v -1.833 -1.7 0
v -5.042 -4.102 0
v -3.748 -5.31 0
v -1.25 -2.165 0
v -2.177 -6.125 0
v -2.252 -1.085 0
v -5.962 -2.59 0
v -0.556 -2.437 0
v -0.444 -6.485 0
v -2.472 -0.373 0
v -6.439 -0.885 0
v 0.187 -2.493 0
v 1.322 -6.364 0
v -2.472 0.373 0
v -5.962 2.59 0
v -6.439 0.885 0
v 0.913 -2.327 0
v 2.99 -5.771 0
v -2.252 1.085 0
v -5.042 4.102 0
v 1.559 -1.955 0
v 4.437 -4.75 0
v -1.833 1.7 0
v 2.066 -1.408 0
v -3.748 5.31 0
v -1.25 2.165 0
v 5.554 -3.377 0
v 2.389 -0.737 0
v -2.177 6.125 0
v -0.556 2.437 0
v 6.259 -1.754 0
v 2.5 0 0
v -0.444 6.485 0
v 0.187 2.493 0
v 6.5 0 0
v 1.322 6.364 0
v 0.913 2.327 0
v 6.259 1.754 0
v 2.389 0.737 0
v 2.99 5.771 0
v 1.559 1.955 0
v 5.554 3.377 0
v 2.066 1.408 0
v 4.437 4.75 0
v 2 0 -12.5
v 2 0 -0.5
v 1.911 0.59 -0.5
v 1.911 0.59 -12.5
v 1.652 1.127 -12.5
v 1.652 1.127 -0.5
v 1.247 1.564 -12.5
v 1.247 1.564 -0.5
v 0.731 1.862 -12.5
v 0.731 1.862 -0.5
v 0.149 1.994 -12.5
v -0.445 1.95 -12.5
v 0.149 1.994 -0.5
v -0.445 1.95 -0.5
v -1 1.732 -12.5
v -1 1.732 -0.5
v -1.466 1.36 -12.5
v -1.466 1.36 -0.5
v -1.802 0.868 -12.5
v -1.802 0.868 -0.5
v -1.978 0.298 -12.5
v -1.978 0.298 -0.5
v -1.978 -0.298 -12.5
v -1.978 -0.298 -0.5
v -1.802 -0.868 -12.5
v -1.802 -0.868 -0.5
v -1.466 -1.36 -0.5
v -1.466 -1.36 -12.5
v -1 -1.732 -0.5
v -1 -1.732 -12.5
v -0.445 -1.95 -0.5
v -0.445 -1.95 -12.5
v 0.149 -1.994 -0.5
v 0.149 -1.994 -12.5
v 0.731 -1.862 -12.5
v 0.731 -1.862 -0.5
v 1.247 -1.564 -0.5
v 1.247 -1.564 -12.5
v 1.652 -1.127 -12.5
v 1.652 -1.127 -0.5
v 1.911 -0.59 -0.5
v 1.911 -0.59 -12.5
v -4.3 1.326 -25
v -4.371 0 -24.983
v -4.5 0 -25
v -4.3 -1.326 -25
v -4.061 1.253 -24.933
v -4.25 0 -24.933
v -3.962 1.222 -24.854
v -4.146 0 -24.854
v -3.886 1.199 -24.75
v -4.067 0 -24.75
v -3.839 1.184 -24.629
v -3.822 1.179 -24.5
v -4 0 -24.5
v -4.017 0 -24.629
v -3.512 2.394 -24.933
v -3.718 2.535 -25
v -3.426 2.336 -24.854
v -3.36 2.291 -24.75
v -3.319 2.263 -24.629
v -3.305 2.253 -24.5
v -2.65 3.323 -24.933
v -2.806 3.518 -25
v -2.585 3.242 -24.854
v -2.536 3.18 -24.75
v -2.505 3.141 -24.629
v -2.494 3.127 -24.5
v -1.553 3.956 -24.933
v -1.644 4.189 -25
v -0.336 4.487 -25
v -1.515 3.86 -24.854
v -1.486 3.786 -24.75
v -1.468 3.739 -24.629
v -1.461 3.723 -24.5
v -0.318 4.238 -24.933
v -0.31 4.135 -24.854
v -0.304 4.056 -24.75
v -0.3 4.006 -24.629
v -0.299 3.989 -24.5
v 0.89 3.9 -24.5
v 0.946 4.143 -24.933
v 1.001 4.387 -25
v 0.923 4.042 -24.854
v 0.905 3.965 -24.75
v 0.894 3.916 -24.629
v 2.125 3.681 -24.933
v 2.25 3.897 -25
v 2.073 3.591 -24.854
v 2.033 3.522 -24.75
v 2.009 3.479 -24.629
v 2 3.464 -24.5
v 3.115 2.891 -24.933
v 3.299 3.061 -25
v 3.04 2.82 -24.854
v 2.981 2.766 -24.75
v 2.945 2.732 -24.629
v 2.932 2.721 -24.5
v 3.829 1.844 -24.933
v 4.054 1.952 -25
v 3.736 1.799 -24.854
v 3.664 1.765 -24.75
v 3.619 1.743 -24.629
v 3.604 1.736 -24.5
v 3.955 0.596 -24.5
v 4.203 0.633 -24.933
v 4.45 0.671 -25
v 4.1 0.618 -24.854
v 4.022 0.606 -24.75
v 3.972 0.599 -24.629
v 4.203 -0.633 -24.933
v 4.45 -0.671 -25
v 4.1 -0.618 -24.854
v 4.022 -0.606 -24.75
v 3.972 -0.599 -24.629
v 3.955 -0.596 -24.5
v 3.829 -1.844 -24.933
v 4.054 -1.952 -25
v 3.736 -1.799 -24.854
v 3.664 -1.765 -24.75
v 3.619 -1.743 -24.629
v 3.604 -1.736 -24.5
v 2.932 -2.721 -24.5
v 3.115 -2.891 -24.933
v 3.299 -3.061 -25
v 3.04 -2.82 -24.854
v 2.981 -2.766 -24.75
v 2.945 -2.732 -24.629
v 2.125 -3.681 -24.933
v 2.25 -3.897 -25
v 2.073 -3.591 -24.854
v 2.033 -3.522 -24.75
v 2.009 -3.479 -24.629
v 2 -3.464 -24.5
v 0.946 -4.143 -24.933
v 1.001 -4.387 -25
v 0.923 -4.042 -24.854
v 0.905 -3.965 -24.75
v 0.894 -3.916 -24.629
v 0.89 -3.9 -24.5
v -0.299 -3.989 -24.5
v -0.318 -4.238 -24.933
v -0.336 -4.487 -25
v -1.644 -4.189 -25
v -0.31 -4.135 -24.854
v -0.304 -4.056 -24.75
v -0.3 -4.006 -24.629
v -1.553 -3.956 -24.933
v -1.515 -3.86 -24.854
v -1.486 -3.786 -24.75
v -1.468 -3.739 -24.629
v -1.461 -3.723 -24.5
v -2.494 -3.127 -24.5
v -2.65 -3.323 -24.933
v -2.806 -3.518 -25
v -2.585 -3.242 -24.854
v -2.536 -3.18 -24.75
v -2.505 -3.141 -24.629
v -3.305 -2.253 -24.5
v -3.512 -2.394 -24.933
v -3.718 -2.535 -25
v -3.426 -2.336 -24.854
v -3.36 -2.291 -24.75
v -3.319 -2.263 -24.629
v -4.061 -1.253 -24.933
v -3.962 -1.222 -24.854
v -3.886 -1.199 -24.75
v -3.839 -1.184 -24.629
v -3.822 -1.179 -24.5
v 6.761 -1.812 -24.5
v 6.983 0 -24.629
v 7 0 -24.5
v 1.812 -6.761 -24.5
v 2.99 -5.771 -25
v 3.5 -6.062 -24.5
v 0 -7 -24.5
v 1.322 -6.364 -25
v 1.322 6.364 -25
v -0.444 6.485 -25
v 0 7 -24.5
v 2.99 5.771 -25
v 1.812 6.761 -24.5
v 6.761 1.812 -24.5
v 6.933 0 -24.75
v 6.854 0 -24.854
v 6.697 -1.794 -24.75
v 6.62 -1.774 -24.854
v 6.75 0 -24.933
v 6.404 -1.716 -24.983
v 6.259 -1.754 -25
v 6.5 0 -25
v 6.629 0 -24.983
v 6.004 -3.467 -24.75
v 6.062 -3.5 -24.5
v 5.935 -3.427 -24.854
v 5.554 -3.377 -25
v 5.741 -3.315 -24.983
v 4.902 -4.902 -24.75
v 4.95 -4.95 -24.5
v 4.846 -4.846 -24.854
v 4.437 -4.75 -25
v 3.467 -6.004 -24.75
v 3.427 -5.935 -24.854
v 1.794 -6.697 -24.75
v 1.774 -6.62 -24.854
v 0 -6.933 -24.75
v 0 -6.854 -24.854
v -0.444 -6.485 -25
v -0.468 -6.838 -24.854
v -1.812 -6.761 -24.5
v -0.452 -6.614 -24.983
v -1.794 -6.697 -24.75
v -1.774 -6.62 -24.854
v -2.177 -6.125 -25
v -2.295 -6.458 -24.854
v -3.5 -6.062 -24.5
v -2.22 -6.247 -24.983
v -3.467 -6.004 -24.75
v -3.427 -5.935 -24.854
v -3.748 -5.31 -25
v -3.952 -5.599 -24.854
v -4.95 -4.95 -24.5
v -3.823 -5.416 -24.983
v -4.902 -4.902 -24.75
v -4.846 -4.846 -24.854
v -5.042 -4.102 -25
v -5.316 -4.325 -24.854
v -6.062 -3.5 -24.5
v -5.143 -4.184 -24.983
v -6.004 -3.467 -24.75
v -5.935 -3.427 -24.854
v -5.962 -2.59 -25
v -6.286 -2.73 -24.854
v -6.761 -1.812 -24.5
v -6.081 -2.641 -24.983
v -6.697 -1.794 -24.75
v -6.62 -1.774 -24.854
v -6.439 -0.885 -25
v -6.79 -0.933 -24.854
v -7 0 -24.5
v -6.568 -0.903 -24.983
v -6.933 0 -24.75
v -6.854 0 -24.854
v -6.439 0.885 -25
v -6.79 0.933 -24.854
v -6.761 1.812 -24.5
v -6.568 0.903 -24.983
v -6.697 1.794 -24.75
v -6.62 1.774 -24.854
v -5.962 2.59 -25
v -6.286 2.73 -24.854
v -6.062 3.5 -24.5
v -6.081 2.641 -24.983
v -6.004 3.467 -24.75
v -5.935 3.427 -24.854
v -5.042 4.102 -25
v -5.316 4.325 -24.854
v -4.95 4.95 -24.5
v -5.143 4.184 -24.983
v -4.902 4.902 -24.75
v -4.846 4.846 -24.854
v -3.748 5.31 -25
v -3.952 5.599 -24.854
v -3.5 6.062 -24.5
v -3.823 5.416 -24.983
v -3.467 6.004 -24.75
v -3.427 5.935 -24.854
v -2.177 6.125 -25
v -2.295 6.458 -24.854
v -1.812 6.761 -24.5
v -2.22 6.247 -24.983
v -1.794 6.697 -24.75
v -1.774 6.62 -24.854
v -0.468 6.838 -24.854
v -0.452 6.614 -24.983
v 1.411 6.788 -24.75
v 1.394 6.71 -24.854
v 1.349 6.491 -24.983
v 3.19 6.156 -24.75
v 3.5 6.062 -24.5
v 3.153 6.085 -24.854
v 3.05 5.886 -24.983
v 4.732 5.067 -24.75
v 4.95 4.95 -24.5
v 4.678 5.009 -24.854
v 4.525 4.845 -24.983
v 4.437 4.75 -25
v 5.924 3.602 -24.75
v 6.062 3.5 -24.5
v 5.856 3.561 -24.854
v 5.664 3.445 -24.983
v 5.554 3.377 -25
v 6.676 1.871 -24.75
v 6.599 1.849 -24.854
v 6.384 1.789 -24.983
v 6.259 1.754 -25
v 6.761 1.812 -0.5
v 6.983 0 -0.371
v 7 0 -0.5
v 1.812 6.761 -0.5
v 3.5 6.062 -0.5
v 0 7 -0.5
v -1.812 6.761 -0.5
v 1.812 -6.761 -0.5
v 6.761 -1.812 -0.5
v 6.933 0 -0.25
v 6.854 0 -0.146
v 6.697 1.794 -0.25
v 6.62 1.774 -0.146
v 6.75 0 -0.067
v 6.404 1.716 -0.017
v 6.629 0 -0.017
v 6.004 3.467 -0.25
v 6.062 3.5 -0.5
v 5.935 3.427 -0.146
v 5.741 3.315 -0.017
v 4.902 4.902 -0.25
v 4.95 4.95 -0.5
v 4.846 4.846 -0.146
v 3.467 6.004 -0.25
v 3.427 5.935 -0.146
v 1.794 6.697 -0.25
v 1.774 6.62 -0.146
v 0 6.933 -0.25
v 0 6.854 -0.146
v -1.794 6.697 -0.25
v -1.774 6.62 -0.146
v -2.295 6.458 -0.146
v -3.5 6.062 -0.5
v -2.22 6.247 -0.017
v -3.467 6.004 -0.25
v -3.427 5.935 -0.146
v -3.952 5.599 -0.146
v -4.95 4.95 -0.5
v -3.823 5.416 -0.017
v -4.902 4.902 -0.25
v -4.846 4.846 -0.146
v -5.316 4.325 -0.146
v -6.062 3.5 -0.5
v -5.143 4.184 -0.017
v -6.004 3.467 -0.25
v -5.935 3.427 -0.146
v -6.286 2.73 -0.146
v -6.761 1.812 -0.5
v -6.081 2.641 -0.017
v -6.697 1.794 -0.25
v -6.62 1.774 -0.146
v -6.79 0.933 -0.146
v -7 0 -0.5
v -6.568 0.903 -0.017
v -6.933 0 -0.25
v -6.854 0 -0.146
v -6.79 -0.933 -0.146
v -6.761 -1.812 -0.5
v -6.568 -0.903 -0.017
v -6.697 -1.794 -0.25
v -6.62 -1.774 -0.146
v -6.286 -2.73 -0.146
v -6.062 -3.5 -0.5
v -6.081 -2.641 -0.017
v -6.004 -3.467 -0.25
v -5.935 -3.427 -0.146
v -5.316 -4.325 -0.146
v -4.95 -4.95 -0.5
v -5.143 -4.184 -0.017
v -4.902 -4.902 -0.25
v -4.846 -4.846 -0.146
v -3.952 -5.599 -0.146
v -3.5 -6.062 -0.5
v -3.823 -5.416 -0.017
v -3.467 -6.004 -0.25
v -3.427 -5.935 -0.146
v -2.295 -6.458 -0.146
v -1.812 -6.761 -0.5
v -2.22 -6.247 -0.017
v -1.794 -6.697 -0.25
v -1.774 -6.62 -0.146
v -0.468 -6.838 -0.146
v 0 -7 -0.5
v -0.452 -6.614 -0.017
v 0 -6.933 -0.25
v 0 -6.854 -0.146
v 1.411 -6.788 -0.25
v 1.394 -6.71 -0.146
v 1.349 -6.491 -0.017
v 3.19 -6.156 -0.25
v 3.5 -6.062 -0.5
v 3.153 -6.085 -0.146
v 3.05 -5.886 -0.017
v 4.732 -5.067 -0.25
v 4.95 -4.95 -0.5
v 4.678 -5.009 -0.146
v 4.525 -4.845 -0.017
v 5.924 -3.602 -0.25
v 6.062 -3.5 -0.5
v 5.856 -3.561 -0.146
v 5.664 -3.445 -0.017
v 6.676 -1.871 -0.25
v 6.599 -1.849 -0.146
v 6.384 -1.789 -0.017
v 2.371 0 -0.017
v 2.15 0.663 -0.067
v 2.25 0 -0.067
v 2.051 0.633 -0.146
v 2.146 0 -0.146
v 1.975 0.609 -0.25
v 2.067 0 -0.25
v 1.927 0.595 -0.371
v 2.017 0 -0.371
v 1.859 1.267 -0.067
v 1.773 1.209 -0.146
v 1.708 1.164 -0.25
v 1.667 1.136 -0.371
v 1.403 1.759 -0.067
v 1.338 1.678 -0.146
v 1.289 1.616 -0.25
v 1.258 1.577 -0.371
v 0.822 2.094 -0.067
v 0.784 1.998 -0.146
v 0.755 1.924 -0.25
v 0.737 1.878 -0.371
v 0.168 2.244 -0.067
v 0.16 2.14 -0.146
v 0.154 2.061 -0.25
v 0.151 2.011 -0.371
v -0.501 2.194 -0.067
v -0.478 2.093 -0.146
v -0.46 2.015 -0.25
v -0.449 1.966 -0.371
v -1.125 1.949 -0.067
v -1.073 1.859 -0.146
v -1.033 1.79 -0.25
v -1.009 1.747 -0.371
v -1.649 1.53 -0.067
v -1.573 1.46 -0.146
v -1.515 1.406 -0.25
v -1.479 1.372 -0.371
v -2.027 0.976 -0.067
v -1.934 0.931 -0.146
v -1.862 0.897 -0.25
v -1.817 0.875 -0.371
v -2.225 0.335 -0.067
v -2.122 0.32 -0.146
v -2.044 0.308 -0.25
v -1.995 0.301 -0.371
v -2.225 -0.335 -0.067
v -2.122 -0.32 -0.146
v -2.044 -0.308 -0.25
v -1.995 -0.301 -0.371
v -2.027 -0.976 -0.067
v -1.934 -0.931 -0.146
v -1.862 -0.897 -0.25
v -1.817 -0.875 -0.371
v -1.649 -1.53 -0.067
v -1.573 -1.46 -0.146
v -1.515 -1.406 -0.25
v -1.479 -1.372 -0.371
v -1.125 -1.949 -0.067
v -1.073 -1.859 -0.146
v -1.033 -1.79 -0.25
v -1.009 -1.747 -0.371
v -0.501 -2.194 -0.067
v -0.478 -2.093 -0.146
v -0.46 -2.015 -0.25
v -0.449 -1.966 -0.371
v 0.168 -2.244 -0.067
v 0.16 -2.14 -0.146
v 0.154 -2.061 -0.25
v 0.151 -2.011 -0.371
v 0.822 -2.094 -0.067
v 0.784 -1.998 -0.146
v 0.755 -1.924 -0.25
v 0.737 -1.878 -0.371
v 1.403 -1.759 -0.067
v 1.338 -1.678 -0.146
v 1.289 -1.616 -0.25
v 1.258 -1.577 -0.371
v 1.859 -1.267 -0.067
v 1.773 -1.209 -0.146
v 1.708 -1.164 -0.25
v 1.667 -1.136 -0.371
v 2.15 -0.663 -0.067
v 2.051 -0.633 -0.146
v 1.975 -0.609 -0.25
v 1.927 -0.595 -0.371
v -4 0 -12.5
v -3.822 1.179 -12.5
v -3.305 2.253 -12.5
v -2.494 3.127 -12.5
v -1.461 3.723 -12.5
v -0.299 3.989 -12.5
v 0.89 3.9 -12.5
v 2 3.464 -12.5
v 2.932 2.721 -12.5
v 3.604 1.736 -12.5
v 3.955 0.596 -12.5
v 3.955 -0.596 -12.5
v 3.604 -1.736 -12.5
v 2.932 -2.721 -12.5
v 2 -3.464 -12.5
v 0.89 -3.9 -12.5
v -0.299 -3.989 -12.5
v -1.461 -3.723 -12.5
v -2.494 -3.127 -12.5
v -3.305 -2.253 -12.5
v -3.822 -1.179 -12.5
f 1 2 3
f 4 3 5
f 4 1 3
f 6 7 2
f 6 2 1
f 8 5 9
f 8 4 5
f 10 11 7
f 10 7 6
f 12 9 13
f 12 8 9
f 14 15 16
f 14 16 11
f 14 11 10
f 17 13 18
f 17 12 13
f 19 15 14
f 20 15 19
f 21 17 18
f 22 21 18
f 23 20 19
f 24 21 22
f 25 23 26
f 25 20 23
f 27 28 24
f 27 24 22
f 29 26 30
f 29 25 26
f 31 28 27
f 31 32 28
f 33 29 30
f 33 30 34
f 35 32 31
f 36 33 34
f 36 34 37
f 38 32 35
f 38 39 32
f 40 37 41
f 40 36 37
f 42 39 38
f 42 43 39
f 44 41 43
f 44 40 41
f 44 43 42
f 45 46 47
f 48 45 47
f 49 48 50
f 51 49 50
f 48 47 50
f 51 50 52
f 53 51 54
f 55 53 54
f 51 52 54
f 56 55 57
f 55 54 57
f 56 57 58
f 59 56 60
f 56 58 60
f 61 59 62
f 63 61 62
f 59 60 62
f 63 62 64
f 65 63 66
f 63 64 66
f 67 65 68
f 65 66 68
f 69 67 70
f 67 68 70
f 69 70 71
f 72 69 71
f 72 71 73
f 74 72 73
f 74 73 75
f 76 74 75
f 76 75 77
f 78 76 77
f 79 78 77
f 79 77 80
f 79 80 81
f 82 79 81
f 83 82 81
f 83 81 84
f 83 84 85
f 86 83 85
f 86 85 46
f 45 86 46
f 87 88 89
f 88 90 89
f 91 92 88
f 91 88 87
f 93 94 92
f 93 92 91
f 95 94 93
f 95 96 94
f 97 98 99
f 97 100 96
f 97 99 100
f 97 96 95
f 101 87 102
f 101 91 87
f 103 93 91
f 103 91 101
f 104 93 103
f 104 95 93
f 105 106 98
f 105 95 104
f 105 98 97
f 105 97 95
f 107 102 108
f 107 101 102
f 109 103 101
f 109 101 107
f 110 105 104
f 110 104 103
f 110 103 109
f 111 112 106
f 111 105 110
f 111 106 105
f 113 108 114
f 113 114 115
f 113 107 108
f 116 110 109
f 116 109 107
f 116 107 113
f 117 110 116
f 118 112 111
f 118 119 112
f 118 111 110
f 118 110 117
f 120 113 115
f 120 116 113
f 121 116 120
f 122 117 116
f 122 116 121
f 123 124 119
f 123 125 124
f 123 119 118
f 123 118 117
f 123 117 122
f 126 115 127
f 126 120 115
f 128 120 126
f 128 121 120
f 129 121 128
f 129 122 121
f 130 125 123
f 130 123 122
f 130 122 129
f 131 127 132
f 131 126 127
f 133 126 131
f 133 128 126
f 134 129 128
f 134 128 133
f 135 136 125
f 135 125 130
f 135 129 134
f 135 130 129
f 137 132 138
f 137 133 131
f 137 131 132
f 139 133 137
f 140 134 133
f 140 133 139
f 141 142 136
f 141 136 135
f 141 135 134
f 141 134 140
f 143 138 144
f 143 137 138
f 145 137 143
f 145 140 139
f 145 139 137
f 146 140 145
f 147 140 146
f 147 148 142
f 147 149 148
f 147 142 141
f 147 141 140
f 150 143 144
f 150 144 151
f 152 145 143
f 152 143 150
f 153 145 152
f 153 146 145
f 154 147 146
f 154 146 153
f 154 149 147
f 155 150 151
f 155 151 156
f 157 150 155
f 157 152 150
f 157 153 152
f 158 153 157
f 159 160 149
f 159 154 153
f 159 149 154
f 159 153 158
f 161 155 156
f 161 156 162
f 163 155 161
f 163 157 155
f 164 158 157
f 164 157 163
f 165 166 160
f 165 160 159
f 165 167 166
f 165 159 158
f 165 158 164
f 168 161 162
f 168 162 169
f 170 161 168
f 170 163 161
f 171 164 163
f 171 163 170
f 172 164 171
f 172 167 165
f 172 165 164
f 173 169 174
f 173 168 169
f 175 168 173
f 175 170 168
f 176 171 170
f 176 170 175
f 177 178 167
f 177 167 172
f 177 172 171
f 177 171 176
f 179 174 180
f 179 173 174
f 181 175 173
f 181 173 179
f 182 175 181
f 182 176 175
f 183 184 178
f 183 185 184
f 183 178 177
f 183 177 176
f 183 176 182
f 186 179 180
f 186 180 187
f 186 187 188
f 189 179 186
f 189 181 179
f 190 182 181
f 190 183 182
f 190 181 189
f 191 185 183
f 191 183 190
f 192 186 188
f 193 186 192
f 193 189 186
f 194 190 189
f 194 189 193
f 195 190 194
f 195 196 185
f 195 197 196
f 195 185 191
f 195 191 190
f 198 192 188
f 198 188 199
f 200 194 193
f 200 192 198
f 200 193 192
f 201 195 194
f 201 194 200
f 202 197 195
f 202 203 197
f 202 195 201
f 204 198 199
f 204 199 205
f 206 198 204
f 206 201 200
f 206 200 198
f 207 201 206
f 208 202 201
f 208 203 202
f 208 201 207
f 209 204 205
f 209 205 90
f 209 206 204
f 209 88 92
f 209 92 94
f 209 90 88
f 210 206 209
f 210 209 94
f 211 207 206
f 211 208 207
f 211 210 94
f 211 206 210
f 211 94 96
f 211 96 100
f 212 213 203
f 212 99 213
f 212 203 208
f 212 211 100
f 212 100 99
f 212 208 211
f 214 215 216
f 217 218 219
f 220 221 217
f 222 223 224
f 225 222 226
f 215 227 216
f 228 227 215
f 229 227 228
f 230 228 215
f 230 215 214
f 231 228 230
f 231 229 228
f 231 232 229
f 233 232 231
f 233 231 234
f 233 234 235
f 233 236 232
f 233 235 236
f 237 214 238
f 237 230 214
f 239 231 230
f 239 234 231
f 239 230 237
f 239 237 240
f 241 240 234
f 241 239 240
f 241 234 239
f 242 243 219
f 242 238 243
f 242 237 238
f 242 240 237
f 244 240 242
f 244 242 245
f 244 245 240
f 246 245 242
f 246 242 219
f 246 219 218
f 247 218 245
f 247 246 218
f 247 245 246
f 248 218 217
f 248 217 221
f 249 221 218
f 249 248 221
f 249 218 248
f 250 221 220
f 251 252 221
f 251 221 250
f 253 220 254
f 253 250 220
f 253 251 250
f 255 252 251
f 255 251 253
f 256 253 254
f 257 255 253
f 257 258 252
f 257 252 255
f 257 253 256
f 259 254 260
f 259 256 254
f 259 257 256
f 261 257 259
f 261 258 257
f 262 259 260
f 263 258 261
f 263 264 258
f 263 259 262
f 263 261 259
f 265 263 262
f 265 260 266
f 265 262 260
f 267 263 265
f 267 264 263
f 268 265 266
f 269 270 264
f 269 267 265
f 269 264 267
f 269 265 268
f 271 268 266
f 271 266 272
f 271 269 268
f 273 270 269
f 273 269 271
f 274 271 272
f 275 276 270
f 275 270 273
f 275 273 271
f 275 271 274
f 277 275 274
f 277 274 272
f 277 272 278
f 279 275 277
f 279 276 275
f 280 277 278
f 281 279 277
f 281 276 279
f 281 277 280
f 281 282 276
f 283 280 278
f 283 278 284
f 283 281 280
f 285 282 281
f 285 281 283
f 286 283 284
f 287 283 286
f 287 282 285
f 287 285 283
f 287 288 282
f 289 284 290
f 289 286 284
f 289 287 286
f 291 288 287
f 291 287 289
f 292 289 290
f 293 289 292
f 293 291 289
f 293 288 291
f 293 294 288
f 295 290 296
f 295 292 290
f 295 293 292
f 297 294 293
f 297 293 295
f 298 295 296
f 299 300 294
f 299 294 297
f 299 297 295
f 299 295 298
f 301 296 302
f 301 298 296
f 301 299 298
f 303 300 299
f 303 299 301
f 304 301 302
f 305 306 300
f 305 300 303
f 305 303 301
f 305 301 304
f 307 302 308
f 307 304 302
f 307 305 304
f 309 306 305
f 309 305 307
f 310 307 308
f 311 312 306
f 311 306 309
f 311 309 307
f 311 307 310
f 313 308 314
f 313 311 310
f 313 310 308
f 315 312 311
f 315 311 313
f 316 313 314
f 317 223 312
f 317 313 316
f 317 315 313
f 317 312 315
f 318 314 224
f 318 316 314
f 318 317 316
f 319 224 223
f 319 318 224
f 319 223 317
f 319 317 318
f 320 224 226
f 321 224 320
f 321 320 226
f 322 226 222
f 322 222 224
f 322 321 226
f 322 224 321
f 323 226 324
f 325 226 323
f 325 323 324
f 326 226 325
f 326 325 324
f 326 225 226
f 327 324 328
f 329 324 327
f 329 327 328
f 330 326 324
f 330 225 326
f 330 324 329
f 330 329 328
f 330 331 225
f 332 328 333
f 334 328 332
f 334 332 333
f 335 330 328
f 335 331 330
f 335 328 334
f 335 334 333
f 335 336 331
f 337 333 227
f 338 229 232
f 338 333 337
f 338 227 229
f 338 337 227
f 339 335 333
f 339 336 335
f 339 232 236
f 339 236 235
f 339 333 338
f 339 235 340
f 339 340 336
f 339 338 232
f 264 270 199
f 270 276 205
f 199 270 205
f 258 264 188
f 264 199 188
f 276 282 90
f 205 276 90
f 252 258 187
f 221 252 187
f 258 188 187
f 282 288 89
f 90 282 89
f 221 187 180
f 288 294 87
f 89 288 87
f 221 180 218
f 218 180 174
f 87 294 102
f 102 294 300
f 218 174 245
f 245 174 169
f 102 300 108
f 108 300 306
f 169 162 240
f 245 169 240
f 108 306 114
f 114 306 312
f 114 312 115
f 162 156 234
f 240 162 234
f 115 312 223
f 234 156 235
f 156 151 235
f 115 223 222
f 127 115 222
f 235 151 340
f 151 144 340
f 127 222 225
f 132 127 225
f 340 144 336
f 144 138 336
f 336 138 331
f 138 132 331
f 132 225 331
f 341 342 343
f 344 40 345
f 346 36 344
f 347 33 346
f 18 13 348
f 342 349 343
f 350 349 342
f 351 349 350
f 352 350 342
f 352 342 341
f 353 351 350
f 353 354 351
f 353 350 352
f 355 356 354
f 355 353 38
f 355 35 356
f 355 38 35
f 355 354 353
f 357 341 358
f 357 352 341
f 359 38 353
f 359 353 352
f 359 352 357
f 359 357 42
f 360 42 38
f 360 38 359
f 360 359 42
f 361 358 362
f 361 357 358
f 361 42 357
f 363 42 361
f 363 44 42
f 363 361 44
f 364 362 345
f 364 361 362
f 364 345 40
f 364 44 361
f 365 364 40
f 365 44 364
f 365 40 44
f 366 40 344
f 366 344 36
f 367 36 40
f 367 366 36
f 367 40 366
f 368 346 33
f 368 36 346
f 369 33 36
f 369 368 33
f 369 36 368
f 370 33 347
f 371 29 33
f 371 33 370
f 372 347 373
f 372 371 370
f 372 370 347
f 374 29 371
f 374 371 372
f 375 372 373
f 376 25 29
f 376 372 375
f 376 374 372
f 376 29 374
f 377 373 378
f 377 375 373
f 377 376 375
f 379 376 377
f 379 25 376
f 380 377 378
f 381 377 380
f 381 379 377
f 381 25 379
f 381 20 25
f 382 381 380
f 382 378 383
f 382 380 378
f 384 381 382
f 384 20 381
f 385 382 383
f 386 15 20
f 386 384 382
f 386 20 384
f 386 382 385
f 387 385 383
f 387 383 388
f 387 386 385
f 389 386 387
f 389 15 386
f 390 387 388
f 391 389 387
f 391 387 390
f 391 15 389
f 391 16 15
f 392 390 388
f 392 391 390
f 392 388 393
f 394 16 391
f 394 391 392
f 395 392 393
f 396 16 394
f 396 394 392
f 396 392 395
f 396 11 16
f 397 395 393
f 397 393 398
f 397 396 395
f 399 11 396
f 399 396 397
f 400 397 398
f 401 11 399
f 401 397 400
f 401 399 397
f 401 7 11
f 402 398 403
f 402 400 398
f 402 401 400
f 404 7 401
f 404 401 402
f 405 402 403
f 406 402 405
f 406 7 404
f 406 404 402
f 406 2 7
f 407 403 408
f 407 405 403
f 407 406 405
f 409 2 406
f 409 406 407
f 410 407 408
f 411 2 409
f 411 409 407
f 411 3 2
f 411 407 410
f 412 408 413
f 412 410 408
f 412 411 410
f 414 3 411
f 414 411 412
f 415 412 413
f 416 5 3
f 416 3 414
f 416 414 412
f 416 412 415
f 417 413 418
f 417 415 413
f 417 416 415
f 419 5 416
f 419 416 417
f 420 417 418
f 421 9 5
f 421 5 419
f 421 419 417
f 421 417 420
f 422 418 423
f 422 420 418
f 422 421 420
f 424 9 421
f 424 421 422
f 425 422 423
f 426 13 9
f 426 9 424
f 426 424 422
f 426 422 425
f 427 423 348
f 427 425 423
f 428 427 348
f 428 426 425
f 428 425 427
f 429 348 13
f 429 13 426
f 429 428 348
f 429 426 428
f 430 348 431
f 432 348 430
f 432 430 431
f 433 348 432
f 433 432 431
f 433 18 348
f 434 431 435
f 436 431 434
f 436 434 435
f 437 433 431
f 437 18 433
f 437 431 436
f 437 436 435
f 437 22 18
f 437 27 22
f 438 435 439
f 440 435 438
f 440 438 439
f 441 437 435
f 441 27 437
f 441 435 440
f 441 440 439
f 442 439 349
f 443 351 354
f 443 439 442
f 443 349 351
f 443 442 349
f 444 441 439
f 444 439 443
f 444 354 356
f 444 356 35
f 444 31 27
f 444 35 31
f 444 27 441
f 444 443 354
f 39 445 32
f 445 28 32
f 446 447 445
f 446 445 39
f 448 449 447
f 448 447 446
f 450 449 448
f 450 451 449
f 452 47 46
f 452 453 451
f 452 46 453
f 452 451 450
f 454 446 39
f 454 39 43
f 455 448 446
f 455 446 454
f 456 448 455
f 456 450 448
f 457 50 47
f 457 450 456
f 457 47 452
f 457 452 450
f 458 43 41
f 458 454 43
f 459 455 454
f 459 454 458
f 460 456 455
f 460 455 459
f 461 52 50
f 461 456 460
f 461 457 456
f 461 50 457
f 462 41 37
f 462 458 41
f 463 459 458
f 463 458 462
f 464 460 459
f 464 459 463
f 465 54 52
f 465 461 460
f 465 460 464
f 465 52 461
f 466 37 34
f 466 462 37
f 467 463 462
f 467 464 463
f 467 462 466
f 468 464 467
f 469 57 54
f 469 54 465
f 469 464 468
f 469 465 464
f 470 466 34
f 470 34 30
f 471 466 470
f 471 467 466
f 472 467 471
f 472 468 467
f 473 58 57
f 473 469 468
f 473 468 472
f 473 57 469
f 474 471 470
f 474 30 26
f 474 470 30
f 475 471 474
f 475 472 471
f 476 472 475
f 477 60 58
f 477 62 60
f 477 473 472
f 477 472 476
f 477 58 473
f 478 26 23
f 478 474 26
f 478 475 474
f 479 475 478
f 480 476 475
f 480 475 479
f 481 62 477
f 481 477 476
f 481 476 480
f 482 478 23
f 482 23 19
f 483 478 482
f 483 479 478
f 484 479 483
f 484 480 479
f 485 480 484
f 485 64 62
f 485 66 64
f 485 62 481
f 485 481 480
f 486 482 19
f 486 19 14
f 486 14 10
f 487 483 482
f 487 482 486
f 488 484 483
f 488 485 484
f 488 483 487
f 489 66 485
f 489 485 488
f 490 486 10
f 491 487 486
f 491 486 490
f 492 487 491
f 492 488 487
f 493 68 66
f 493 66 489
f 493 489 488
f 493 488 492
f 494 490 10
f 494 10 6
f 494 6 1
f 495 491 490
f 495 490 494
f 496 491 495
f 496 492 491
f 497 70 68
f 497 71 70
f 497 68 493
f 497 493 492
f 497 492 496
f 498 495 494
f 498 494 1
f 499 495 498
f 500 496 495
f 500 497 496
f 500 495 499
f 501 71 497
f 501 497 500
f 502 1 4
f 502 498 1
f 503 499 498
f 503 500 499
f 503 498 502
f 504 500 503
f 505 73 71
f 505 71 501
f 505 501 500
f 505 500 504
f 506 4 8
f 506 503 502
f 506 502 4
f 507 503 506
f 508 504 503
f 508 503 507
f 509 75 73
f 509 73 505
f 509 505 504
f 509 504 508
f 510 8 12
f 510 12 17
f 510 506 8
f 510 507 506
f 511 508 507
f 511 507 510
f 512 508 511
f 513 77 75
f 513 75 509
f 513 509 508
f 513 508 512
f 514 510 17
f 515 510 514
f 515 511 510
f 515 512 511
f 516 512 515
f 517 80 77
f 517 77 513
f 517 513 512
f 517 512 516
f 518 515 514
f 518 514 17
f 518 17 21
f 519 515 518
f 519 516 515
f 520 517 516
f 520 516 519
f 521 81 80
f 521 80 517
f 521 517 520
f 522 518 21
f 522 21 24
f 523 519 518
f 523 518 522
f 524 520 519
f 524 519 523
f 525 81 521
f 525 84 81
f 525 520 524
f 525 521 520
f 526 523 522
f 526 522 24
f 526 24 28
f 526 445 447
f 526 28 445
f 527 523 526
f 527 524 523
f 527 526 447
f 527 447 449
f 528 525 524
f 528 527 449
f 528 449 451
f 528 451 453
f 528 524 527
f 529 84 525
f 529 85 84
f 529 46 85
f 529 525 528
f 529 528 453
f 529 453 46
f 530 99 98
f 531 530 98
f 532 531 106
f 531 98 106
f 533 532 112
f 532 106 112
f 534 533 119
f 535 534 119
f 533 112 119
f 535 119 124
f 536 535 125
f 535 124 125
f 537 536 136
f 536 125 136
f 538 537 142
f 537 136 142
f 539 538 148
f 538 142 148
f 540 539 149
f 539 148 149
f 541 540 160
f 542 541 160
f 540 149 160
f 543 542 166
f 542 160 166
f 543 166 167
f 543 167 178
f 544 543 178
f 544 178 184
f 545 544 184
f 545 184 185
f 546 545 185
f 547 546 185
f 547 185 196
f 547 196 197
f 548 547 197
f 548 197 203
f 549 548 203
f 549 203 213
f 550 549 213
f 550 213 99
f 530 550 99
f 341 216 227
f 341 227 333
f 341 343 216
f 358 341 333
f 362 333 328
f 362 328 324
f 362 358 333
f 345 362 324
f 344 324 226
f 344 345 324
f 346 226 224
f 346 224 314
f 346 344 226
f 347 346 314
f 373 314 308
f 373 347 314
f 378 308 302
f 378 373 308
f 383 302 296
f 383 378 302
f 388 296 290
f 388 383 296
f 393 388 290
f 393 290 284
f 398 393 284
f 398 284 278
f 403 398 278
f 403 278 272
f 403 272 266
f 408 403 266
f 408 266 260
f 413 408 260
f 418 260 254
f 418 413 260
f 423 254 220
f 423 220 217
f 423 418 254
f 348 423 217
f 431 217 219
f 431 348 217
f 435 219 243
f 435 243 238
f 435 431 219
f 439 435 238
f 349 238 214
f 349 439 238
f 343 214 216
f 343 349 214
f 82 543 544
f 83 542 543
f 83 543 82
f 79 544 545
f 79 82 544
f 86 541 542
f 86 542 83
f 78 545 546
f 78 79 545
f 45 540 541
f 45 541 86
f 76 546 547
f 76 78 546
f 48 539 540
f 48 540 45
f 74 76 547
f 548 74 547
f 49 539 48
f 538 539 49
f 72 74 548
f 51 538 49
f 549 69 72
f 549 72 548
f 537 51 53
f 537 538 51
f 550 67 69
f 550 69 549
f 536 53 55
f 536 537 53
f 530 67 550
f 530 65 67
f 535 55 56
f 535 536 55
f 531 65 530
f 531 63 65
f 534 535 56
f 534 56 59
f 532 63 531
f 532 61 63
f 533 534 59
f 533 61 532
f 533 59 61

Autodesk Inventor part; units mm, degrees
ref_plane "YZ Plane" through (0, 0, 0) normal (1, 0, 0) x (0, 1, 0)
ref_plane "XZ Plane" through (0, 0, 0) normal (0, 1, 0) x (-1, 0, 0)
ref_plane "XY Plane" through (0, 0, 0) normal (0, 0, 1) x (1, 0, 0)
sketch "スケッチ1" plane through (0, 0, 0) normal (0, 0, 1) x (1, 0, 0)
  circle A0 centre (0, 0) radius 7
  dimension "d0" = 14
extrude "押し出し1" add sketch "スケッチ1" against normal blind 25
sketch "スケッチ2" plane through (0, 0, 0) normal (0, 0, 1) x (1, 0, 0)
  circle A0 centre (0, 0) radius 2
  dimension "d3" = 4
sketch "スケッチ3" plane through (0, 0, -25) normal (0, 0, -1) x (-1, 0, 0)
  circle A0 centre (0, 0) radius 4
  dimension "d4" = 8
extrude "押し出し2" cut sketch "スケッチ3" against normal blind 12.5
extrude "押し出し3" cut sketch "スケッチ2" against normal blind 12.5
fillet "フィレット1" radius 0.5 1 edges at (-7, 0, 0)
fillet "フィレット2" radius 0.5 3 edges at (-2, 0, 0) (-7, 0, -25) (4, 0, -25)
properties part number "4mm-8mmカップリング"
